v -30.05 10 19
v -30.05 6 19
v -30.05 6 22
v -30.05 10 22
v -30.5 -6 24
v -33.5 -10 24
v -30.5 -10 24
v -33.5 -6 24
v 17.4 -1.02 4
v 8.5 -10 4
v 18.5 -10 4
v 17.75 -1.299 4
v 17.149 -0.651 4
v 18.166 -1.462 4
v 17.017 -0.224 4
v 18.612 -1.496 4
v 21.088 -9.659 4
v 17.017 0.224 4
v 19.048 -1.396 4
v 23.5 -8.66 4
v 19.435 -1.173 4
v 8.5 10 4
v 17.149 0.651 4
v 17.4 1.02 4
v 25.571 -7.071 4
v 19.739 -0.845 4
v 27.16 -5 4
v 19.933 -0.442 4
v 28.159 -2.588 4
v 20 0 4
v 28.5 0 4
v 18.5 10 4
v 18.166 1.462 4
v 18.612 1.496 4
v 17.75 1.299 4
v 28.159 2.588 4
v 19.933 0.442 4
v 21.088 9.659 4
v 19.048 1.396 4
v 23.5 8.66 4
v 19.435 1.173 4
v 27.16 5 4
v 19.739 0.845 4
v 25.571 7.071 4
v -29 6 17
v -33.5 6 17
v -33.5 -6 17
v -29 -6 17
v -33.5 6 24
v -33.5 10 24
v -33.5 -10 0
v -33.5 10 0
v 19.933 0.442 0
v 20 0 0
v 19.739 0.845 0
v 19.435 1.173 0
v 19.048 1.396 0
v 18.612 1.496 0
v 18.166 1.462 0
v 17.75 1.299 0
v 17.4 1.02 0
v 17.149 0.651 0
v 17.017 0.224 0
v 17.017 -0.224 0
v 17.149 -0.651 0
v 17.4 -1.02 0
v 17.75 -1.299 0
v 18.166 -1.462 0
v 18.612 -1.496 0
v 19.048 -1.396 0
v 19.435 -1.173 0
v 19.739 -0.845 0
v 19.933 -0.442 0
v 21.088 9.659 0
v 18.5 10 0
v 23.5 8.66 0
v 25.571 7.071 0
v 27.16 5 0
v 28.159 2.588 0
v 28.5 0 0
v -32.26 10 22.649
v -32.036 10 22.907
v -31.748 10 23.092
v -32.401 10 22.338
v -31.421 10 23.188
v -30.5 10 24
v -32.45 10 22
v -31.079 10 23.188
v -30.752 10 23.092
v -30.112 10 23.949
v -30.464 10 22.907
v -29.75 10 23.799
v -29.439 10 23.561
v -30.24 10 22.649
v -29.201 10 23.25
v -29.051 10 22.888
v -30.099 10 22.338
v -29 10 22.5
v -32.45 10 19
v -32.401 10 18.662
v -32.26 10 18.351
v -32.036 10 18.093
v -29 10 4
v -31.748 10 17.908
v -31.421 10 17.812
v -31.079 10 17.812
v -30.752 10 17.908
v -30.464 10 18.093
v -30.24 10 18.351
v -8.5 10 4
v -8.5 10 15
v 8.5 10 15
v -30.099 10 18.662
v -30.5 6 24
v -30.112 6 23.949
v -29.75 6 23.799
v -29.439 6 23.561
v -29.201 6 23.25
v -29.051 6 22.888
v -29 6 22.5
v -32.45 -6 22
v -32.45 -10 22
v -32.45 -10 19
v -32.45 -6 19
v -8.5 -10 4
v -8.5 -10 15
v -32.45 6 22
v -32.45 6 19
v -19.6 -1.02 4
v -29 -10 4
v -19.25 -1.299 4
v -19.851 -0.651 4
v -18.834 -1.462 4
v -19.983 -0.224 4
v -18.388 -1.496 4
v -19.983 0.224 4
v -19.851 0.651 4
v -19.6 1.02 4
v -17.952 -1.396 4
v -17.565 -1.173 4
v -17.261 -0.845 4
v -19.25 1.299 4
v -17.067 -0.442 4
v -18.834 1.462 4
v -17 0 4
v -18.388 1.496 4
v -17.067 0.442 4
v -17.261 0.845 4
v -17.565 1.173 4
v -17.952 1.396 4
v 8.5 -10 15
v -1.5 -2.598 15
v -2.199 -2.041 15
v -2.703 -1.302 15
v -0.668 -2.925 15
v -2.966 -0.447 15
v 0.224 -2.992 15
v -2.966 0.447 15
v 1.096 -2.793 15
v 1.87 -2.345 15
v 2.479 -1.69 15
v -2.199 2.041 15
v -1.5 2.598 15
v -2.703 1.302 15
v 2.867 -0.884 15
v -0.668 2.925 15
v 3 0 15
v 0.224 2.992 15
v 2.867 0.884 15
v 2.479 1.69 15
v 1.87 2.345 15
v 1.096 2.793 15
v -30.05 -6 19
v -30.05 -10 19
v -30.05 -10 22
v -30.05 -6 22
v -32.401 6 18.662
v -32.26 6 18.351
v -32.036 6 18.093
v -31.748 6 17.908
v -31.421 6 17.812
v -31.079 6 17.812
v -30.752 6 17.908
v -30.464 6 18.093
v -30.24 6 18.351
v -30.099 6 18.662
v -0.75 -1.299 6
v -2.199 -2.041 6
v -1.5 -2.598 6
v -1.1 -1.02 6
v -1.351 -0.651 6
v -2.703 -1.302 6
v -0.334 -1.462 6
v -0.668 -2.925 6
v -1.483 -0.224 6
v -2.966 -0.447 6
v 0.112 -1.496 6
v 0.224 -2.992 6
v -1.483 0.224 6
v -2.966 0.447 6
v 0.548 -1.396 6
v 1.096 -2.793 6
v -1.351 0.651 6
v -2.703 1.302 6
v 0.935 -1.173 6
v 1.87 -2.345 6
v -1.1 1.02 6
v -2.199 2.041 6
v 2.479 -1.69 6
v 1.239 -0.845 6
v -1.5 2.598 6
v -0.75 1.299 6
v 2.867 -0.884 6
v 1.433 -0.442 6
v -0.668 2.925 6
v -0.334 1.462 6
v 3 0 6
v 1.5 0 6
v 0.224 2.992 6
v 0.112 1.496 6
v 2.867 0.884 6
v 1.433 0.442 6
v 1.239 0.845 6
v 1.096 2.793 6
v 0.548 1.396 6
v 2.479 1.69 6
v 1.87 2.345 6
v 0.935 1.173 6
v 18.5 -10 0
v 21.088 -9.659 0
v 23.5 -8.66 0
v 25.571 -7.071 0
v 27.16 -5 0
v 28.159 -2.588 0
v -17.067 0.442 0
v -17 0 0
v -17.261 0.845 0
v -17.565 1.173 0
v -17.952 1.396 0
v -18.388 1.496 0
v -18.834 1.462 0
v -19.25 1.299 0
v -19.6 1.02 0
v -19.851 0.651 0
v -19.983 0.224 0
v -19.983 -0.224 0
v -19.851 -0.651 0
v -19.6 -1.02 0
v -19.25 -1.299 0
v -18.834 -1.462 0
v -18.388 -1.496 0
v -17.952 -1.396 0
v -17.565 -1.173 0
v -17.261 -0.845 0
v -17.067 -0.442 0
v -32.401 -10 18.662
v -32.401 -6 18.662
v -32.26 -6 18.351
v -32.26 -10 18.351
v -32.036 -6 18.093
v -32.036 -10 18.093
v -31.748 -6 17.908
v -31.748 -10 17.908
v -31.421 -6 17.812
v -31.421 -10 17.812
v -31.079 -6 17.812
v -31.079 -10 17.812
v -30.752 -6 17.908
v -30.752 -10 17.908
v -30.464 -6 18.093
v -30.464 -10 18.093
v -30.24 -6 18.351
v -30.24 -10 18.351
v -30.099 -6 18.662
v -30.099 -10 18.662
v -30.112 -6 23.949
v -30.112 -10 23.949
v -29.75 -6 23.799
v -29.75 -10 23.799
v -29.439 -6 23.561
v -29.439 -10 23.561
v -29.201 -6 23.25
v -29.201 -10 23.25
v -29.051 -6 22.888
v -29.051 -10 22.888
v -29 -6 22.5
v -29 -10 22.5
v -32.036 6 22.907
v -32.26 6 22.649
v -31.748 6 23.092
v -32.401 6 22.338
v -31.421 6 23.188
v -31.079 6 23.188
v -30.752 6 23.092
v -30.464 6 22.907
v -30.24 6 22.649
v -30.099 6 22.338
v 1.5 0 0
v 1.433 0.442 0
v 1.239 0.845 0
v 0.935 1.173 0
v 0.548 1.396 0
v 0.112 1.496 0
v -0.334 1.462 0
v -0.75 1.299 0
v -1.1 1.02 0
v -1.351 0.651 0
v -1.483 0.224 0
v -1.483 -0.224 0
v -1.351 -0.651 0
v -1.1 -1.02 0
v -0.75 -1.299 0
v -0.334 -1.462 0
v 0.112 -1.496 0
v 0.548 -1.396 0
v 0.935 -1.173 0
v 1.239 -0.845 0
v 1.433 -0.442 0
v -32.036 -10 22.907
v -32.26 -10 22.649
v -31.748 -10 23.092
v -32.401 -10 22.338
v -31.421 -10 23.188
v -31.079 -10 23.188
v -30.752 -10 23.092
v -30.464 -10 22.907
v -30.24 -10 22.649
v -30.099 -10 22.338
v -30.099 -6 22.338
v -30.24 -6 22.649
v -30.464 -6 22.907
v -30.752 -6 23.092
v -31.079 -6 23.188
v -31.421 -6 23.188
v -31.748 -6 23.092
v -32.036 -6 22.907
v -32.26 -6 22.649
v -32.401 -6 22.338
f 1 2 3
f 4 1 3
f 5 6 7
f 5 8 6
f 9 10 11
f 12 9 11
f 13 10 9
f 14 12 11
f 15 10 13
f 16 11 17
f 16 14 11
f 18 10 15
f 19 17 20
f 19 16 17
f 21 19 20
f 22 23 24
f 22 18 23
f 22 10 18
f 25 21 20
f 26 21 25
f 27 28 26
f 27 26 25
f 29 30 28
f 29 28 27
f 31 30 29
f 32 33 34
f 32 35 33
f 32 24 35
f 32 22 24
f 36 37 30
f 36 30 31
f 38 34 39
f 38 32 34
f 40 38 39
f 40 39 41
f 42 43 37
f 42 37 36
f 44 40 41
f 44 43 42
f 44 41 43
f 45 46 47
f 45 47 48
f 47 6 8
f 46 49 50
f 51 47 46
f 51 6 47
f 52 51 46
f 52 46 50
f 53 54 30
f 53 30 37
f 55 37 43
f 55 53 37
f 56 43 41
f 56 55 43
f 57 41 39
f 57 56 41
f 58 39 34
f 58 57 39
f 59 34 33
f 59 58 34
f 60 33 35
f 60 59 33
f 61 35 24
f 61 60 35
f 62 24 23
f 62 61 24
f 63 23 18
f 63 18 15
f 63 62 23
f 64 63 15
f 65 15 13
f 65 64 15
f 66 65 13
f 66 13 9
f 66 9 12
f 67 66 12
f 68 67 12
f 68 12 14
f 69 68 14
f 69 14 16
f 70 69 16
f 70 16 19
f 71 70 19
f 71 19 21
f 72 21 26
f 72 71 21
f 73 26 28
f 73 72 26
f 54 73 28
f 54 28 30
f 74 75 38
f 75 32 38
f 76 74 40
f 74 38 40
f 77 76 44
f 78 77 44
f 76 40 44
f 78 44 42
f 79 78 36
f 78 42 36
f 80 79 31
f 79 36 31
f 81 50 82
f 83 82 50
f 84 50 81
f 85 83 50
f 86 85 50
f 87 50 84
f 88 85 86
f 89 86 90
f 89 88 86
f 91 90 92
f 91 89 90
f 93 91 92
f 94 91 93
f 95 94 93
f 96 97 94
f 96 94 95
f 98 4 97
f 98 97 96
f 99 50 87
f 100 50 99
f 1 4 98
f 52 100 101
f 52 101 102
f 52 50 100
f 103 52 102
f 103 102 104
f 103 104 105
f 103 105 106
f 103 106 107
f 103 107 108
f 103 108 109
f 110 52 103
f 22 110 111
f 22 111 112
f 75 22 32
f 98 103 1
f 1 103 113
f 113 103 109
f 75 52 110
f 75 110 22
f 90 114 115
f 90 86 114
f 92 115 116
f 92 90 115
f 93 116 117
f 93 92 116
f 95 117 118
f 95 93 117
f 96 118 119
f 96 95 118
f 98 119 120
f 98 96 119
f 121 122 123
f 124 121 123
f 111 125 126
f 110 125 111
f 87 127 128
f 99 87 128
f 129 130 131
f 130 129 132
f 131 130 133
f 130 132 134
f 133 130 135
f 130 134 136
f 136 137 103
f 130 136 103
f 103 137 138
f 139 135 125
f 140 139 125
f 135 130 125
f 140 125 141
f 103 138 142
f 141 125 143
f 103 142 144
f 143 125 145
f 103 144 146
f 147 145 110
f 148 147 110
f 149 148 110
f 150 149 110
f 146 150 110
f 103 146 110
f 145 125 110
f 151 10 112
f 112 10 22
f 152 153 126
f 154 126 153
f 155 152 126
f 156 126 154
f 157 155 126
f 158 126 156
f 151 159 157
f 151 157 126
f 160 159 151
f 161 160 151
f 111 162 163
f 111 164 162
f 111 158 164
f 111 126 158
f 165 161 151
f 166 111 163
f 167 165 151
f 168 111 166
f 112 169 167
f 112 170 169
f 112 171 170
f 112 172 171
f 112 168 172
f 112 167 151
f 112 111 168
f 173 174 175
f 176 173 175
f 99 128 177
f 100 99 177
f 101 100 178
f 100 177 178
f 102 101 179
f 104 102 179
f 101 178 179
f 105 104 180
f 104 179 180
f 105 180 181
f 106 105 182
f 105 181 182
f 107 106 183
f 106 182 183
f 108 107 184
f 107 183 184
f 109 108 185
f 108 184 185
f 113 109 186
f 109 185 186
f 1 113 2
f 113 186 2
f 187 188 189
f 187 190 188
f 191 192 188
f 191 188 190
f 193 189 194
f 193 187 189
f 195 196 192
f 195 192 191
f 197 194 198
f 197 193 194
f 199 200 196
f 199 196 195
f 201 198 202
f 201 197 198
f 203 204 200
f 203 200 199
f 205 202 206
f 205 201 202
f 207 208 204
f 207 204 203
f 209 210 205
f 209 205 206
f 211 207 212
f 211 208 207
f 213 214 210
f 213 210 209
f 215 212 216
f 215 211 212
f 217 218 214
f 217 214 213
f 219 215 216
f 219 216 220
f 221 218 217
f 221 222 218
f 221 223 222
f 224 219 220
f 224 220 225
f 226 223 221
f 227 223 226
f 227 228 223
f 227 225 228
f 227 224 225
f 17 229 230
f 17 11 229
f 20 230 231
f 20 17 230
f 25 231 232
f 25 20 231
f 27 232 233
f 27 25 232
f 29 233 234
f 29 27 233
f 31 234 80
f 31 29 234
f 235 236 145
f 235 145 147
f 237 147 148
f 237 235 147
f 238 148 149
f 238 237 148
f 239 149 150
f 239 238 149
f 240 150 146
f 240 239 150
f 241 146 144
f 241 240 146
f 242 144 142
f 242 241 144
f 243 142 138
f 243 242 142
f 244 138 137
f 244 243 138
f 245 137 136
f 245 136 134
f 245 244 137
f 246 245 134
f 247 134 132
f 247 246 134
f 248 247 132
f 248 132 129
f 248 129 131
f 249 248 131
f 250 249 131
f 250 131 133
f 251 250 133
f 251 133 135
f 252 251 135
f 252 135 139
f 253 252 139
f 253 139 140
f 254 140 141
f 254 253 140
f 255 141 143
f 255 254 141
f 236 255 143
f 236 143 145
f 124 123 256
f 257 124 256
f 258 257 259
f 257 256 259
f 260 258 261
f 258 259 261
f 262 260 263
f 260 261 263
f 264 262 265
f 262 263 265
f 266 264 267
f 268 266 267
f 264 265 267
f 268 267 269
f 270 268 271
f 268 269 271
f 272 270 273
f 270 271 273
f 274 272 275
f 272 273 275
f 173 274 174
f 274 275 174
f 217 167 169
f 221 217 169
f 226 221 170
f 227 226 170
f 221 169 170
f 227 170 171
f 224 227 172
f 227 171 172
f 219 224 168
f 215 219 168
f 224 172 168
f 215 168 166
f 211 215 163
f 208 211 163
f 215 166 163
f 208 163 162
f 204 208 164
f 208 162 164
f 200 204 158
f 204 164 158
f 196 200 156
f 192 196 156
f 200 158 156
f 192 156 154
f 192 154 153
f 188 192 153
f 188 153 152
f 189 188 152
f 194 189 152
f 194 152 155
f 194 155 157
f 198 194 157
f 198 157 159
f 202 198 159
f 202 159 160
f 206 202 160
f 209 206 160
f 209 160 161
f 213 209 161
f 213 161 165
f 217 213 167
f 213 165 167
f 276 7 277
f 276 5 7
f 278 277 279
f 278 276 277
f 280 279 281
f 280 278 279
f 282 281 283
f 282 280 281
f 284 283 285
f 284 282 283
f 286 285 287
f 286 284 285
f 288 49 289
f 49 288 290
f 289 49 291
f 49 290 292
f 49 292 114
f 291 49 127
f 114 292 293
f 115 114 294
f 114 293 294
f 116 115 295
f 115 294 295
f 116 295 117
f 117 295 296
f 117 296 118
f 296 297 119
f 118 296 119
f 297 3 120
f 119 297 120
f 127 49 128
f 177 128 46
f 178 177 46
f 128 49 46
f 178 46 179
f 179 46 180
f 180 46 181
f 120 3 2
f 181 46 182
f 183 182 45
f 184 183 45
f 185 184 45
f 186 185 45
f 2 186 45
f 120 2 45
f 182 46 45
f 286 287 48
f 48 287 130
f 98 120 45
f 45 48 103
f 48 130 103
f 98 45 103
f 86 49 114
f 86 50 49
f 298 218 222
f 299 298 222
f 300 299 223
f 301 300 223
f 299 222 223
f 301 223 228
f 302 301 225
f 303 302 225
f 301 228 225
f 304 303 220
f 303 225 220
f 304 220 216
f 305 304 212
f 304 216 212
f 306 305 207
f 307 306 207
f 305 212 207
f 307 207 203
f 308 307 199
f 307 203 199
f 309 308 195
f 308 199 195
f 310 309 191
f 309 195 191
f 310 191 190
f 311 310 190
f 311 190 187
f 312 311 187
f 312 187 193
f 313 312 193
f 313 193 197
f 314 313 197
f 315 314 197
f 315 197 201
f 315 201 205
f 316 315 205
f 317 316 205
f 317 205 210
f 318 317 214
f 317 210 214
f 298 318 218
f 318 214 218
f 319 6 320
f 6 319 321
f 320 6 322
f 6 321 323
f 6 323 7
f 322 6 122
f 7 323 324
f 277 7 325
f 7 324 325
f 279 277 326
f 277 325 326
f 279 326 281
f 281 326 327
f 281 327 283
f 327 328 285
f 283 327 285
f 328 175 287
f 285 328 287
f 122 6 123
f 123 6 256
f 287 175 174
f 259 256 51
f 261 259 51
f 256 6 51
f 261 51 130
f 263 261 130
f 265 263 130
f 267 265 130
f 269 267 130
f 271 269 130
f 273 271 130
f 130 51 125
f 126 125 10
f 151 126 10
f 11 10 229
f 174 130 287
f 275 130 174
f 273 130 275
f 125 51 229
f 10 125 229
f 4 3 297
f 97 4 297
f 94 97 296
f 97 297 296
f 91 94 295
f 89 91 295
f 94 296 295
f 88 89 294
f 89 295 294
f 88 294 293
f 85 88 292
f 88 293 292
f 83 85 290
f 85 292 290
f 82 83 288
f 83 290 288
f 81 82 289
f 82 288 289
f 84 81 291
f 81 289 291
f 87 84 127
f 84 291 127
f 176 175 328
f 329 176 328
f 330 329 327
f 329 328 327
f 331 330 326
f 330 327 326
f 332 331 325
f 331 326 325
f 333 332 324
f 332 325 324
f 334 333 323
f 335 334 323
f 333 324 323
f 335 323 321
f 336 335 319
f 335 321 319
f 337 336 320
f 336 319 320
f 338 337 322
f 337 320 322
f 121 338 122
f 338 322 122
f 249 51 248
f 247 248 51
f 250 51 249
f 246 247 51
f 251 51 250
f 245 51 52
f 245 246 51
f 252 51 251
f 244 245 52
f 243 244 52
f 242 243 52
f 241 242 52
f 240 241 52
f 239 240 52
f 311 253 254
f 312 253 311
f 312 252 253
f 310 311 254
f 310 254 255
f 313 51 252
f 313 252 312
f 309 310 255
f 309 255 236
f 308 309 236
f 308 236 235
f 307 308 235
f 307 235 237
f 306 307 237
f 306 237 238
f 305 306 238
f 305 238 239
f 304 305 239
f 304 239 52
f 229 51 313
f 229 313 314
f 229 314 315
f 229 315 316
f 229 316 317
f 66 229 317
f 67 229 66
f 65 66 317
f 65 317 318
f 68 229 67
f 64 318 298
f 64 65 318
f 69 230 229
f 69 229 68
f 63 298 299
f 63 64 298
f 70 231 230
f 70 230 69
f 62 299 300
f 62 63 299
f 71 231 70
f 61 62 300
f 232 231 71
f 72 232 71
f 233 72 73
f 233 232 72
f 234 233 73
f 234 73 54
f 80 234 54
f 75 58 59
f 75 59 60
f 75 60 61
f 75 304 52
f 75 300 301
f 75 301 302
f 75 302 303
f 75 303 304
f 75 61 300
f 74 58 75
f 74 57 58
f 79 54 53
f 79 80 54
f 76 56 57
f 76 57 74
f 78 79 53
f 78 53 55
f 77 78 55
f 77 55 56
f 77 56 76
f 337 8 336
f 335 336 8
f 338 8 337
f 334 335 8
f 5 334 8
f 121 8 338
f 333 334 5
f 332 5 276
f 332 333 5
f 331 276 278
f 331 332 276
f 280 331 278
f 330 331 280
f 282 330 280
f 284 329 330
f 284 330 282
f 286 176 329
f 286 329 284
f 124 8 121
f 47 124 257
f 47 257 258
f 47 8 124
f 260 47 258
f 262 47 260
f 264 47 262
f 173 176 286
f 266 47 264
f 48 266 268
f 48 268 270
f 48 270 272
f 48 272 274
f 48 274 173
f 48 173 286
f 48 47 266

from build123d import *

# Parameters (mm, degrees)
SKETCH_1_W          = 57
SKETCH_1_H          = 20
SKETCH_1_R          = 1.5
EXTRUDE_1_DEPTH     = 4
FILLET_1_R          = 10
SKETCH_4_W          = 17
SKETCH_4_H          = 20
EXTRUDE_3_DEPTH     = 11
SKETCH_5_R          = 3
CUT_EXTRUDE_1_DEPTH = 9
SKETCH_6_R          = 1.5
CUT_EXTRUDE_2_DEPTH = 6
SKETCH_7_W          = 4
SKETCH_7_H          = 20
EXTRUDE_4_DEPTH     = 5
SKETCH_8_W          = 4.5
SKETCH_8_H          = 20
EXTRUDE_5_DEPTH     = 13
SKETCH_9_W          = 4.5
SKETCH_9_H          = 4
EXTRUDE_6_DEPTH     = 7
CUT_EXTRUDE_START   = -20
CUT_EXTRUDE_3_DEPTH = 20
FILLET_2_R          = 1.5


with BuildPart() as part:
    # 草图1 → 凸台-拉伸1 (new body)
    with BuildSketch(Plane.XY):
        Rectangle(SKETCH_1_W, SKETCH_1_H)
        with Locations((-18.5, 0)):
            Circle(SKETCH_1_R, mode=Mode.SUBTRACT)
        with Locations((18.5, 0)):
            Circle(SKETCH_1_R, mode=Mode.SUBTRACT)
    extrude(amount=EXTRUDE_1_DEPTH)

    # 圆角1
    fillet_1_edges = [part.edges().sort_by_distance(p)[0] for p in [
        (28.5, -10, 2),
        (28.5, 10, 2),
    ]]
    fillet(fillet_1_edges, radius=FILLET_1_R - 0.0001)  # a hair under: the kernel refuses the full size

    # 草图4 → 凸台-拉伸3 (add)
    with BuildSketch(Plane.XY.offset(4)):
        Rectangle(SKETCH_4_W, SKETCH_4_H)
    extrude(amount=EXTRUDE_3_DEPTH)

    # 草图5 → 切除-拉伸1 (cut)
    with BuildSketch(Plane.XY.offset(15)):
        Circle(SKETCH_5_R)
    extrude(amount=-CUT_EXTRUDE_1_DEPTH, mode=Mode.SUBTRACT)

    # 草图6 → 切除-拉伸2 (cut)
    with BuildSketch(Plane.XY.offset(6)):
        Circle(SKETCH_6_R)
    extrude(amount=-CUT_EXTRUDE_2_DEPTH, mode=Mode.SUBTRACT)

    # 草图7 → 凸台-拉伸4 (add)
    with BuildSketch(Plane.ZY.offset(28.5)):
        with Locations((2, 0)):
            Rectangle(SKETCH_7_W, SKETCH_7_H)
    extrude(amount=EXTRUDE_4_DEPTH)

    # 草图8 → 凸台-拉伸5 (add)
    with BuildSketch(Plane.XY.offset(4)):
        with Locations((-31.25, 0)):
            Rectangle(SKETCH_8_W, SKETCH_8_H)
    extrude(amount=EXTRUDE_5_DEPTH)

    # 草图9 → 凸台-拉伸6 (add)
    with BuildSketch(Plane.XY.offset(17)):
        with Locations((-31.25, 8)):
            Rectangle(SKETCH_9_W, SKETCH_9_H)
        with Locations((-31.25, -8)):
            Rectangle(SKETCH_9_W, SKETCH_9_H)
    extrude(amount=EXTRUDE_6_DEPTH)

    # 草图10 → 切除-拉伸3 (cut)
    with BuildSketch(Plane(origin=(0, 10, 0), x_dir=(1, 0, 0), z_dir=(0, 1, 0)).offset(CUT_EXTRUDE_START)):
        with BuildLine():
            Line((-32.45, -22), (-32.45, -19))
            ThreePointArc((-32.45, -19), (-31.25, -17.8), (-30.05, -19))
            Line((-30.05, -19), (-30.05, -22))
            ThreePointArc((-30.05, -22), (-31.25, -23.2), (-32.45, -22))
        make_face()
    extrude(amount=CUT_EXTRUDE_3_DEPTH, mode=Mode.SUBTRACT)

    # 圆角2
    fillet_2_edges = [part.edges().sort_by_distance(p)[0] for p in [
        (-29, 8, 24),
        (-29, -8, 24),
    ]]
    fillet(fillet_2_edges, radius=FILLET_2_R)


solid = part.part
